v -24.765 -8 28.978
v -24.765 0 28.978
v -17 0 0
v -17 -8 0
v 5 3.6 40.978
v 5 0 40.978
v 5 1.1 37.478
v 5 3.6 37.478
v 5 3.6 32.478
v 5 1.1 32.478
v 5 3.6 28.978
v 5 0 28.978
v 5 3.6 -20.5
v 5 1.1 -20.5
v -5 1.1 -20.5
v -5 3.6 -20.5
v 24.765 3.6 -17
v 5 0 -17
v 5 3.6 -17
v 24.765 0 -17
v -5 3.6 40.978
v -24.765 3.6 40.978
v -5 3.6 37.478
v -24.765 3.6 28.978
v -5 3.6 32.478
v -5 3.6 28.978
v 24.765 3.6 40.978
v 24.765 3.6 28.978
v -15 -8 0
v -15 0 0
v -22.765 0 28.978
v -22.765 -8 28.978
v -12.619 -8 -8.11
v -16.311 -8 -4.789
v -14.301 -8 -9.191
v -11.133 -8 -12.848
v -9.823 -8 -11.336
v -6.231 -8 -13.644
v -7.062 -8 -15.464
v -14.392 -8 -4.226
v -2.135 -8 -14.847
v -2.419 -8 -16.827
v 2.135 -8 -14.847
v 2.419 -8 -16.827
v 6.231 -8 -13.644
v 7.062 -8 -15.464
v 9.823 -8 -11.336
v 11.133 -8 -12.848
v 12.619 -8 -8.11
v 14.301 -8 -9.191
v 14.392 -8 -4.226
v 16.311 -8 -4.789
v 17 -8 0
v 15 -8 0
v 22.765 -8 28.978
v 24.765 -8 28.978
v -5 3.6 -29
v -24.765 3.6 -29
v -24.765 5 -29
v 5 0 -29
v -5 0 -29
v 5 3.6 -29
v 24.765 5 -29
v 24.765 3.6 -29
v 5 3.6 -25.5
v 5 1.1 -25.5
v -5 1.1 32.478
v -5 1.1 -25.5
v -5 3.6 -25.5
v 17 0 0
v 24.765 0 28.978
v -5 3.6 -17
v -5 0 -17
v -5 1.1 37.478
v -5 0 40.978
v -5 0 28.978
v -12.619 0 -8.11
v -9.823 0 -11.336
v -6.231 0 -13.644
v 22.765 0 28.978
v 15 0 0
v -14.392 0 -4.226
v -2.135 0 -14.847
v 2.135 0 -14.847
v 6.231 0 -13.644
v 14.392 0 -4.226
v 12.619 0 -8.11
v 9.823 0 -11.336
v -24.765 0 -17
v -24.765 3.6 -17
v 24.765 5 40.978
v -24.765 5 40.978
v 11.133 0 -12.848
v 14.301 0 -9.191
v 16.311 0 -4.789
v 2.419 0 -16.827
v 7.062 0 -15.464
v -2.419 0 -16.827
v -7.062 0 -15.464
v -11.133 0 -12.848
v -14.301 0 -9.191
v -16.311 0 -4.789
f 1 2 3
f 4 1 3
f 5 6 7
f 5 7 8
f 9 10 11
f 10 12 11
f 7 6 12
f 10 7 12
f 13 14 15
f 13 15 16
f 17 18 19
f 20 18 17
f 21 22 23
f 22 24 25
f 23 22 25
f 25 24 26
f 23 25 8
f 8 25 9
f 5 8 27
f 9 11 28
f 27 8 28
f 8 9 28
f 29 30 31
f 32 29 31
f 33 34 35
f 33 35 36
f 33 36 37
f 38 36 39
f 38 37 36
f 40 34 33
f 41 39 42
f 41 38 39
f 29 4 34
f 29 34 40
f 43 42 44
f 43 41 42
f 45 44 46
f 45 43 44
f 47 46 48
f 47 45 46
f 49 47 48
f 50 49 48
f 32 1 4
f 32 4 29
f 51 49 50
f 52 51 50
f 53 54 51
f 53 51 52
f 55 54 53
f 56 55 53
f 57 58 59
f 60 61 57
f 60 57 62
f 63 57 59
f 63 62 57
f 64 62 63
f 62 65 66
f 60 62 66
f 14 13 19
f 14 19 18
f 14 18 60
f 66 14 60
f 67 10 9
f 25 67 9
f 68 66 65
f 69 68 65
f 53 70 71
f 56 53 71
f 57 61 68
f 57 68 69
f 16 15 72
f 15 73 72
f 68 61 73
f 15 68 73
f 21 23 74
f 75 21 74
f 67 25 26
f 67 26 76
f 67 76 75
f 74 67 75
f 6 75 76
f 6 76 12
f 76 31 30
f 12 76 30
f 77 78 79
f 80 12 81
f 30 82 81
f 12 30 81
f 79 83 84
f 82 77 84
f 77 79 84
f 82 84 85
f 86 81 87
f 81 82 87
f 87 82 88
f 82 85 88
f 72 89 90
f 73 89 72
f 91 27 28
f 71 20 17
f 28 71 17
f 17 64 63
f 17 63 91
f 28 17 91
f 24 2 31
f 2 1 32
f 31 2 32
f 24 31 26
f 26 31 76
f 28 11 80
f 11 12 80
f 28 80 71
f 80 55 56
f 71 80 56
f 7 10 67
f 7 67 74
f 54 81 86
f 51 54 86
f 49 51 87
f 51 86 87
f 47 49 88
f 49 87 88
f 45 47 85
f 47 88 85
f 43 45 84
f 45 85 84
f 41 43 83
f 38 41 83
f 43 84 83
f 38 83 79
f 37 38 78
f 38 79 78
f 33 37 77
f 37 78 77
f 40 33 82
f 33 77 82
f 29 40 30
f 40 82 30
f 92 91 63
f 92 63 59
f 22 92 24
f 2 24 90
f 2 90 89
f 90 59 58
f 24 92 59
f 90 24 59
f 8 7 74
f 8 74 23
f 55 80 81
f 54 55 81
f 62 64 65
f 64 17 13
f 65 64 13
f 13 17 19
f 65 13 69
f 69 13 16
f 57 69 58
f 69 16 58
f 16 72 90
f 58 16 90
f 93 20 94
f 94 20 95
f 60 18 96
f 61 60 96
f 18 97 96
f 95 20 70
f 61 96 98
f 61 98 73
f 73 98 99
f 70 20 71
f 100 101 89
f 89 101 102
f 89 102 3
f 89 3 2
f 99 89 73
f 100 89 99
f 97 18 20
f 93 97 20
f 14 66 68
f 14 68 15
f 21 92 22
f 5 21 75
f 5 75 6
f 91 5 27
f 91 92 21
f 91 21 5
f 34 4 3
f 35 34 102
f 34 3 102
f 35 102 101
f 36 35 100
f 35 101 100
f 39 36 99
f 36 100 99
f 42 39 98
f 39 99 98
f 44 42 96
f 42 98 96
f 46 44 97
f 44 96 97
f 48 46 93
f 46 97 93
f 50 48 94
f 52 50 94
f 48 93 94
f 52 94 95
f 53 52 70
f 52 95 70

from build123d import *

# Parameters (mm, degrees)
F1_DEPTH  = 8
F2_W      = 49.5291427062
F2_H      = 45.9777747887
F3_DEPTH  = 5
F5_DEPTH  = 12
F6_W      = 2.5
F6_H      = 5
F7_DEPTH  = 29.7655713531
F9_DEPTH  = 12
F10_W     = 2.5
F10_H     = 5
F11_DEPTH = 29.7655713531


with BuildPart() as f1:
    # F0 (on Front) → F1 (new body)
    with BuildSketch(Plane.XZ):
        with BuildLine():
            ThreePointArc((15, 0), (0, -15), (-15, 0))
            Line((-15, 0), (-22.7645713531, 28.9777747887))
            Line((-22.7645713531, 28.9777747887), (-24.7645713531, 28.9777747887))
            Line((-24.7645713531, 28.9777747887), (-17, 0))
            ThreePointArc((-17, 0), (0, -17), (17, 0))
            Line((17, 0), (24.7645713531, 28.9777747887))
            Line((24.7645713531, 28.9777747887), (22.7645713531, 28.9777747887))
            Line((22.7645713531, 28.9777747887), (15, 0))
        make_face()
    extrude(amount=F1_DEPTH)

    # F2 (on Front) → F3 (join)
    with BuildSketch(Plane.XZ):
        with Locations((0, 5.9888873943)):
            Rectangle(F2_W, F2_H)
    extrude(amount=-F3_DEPTH)

    # F4 (on face) → F5 (join)
    with BuildSketch(Plane(origin=(0, 0, -17), x_dir=(1, 0, 0), z_dir=(0, 0, -1))):
        Polygon((5, 0), (-5, 0), (-5, -3.6), (-24.7645713531, -3.6), (-24.7645713531, -5), (24.7645713531, -5), (24.7645713531, -3.6), (5, -3.6), align=None)
    extrude(amount=F5_DEPTH)

    # F6 (on face) → F7 (cut, through all)
    with BuildSketch(Plane.YZ.offset(5)):
        with Locations((2.35, -23)):
            Rectangle(F6_W, F6_H)
    extrude(amount=-F7_DEPTH, mode=Mode.SUBTRACT)

    # F8 (on face) → F9 (join)
    with BuildSketch(Plane.XY.offset(28.9777747887)):
        Polygon((24.7645713531, 5), (-24.7645713531, 5), (-24.7645713531, 3.6), (-5, 3.6), (-5, 0), (5, 0), (5, 3.6), (24.7645713531, 3.6), align=None)
    extrude(amount=F9_DEPTH)

    # F10 (on face) → F11 (cut, through all)
    with BuildSketch(Plane.YZ.offset(5)):
        with Locations((2.35, 34.9777747887)):
            Rectangle(F10_W, F10_H)
    extrude(amount=-F11_DEPTH, mode=Mode.SUBTRACT)


solid = f1.part
